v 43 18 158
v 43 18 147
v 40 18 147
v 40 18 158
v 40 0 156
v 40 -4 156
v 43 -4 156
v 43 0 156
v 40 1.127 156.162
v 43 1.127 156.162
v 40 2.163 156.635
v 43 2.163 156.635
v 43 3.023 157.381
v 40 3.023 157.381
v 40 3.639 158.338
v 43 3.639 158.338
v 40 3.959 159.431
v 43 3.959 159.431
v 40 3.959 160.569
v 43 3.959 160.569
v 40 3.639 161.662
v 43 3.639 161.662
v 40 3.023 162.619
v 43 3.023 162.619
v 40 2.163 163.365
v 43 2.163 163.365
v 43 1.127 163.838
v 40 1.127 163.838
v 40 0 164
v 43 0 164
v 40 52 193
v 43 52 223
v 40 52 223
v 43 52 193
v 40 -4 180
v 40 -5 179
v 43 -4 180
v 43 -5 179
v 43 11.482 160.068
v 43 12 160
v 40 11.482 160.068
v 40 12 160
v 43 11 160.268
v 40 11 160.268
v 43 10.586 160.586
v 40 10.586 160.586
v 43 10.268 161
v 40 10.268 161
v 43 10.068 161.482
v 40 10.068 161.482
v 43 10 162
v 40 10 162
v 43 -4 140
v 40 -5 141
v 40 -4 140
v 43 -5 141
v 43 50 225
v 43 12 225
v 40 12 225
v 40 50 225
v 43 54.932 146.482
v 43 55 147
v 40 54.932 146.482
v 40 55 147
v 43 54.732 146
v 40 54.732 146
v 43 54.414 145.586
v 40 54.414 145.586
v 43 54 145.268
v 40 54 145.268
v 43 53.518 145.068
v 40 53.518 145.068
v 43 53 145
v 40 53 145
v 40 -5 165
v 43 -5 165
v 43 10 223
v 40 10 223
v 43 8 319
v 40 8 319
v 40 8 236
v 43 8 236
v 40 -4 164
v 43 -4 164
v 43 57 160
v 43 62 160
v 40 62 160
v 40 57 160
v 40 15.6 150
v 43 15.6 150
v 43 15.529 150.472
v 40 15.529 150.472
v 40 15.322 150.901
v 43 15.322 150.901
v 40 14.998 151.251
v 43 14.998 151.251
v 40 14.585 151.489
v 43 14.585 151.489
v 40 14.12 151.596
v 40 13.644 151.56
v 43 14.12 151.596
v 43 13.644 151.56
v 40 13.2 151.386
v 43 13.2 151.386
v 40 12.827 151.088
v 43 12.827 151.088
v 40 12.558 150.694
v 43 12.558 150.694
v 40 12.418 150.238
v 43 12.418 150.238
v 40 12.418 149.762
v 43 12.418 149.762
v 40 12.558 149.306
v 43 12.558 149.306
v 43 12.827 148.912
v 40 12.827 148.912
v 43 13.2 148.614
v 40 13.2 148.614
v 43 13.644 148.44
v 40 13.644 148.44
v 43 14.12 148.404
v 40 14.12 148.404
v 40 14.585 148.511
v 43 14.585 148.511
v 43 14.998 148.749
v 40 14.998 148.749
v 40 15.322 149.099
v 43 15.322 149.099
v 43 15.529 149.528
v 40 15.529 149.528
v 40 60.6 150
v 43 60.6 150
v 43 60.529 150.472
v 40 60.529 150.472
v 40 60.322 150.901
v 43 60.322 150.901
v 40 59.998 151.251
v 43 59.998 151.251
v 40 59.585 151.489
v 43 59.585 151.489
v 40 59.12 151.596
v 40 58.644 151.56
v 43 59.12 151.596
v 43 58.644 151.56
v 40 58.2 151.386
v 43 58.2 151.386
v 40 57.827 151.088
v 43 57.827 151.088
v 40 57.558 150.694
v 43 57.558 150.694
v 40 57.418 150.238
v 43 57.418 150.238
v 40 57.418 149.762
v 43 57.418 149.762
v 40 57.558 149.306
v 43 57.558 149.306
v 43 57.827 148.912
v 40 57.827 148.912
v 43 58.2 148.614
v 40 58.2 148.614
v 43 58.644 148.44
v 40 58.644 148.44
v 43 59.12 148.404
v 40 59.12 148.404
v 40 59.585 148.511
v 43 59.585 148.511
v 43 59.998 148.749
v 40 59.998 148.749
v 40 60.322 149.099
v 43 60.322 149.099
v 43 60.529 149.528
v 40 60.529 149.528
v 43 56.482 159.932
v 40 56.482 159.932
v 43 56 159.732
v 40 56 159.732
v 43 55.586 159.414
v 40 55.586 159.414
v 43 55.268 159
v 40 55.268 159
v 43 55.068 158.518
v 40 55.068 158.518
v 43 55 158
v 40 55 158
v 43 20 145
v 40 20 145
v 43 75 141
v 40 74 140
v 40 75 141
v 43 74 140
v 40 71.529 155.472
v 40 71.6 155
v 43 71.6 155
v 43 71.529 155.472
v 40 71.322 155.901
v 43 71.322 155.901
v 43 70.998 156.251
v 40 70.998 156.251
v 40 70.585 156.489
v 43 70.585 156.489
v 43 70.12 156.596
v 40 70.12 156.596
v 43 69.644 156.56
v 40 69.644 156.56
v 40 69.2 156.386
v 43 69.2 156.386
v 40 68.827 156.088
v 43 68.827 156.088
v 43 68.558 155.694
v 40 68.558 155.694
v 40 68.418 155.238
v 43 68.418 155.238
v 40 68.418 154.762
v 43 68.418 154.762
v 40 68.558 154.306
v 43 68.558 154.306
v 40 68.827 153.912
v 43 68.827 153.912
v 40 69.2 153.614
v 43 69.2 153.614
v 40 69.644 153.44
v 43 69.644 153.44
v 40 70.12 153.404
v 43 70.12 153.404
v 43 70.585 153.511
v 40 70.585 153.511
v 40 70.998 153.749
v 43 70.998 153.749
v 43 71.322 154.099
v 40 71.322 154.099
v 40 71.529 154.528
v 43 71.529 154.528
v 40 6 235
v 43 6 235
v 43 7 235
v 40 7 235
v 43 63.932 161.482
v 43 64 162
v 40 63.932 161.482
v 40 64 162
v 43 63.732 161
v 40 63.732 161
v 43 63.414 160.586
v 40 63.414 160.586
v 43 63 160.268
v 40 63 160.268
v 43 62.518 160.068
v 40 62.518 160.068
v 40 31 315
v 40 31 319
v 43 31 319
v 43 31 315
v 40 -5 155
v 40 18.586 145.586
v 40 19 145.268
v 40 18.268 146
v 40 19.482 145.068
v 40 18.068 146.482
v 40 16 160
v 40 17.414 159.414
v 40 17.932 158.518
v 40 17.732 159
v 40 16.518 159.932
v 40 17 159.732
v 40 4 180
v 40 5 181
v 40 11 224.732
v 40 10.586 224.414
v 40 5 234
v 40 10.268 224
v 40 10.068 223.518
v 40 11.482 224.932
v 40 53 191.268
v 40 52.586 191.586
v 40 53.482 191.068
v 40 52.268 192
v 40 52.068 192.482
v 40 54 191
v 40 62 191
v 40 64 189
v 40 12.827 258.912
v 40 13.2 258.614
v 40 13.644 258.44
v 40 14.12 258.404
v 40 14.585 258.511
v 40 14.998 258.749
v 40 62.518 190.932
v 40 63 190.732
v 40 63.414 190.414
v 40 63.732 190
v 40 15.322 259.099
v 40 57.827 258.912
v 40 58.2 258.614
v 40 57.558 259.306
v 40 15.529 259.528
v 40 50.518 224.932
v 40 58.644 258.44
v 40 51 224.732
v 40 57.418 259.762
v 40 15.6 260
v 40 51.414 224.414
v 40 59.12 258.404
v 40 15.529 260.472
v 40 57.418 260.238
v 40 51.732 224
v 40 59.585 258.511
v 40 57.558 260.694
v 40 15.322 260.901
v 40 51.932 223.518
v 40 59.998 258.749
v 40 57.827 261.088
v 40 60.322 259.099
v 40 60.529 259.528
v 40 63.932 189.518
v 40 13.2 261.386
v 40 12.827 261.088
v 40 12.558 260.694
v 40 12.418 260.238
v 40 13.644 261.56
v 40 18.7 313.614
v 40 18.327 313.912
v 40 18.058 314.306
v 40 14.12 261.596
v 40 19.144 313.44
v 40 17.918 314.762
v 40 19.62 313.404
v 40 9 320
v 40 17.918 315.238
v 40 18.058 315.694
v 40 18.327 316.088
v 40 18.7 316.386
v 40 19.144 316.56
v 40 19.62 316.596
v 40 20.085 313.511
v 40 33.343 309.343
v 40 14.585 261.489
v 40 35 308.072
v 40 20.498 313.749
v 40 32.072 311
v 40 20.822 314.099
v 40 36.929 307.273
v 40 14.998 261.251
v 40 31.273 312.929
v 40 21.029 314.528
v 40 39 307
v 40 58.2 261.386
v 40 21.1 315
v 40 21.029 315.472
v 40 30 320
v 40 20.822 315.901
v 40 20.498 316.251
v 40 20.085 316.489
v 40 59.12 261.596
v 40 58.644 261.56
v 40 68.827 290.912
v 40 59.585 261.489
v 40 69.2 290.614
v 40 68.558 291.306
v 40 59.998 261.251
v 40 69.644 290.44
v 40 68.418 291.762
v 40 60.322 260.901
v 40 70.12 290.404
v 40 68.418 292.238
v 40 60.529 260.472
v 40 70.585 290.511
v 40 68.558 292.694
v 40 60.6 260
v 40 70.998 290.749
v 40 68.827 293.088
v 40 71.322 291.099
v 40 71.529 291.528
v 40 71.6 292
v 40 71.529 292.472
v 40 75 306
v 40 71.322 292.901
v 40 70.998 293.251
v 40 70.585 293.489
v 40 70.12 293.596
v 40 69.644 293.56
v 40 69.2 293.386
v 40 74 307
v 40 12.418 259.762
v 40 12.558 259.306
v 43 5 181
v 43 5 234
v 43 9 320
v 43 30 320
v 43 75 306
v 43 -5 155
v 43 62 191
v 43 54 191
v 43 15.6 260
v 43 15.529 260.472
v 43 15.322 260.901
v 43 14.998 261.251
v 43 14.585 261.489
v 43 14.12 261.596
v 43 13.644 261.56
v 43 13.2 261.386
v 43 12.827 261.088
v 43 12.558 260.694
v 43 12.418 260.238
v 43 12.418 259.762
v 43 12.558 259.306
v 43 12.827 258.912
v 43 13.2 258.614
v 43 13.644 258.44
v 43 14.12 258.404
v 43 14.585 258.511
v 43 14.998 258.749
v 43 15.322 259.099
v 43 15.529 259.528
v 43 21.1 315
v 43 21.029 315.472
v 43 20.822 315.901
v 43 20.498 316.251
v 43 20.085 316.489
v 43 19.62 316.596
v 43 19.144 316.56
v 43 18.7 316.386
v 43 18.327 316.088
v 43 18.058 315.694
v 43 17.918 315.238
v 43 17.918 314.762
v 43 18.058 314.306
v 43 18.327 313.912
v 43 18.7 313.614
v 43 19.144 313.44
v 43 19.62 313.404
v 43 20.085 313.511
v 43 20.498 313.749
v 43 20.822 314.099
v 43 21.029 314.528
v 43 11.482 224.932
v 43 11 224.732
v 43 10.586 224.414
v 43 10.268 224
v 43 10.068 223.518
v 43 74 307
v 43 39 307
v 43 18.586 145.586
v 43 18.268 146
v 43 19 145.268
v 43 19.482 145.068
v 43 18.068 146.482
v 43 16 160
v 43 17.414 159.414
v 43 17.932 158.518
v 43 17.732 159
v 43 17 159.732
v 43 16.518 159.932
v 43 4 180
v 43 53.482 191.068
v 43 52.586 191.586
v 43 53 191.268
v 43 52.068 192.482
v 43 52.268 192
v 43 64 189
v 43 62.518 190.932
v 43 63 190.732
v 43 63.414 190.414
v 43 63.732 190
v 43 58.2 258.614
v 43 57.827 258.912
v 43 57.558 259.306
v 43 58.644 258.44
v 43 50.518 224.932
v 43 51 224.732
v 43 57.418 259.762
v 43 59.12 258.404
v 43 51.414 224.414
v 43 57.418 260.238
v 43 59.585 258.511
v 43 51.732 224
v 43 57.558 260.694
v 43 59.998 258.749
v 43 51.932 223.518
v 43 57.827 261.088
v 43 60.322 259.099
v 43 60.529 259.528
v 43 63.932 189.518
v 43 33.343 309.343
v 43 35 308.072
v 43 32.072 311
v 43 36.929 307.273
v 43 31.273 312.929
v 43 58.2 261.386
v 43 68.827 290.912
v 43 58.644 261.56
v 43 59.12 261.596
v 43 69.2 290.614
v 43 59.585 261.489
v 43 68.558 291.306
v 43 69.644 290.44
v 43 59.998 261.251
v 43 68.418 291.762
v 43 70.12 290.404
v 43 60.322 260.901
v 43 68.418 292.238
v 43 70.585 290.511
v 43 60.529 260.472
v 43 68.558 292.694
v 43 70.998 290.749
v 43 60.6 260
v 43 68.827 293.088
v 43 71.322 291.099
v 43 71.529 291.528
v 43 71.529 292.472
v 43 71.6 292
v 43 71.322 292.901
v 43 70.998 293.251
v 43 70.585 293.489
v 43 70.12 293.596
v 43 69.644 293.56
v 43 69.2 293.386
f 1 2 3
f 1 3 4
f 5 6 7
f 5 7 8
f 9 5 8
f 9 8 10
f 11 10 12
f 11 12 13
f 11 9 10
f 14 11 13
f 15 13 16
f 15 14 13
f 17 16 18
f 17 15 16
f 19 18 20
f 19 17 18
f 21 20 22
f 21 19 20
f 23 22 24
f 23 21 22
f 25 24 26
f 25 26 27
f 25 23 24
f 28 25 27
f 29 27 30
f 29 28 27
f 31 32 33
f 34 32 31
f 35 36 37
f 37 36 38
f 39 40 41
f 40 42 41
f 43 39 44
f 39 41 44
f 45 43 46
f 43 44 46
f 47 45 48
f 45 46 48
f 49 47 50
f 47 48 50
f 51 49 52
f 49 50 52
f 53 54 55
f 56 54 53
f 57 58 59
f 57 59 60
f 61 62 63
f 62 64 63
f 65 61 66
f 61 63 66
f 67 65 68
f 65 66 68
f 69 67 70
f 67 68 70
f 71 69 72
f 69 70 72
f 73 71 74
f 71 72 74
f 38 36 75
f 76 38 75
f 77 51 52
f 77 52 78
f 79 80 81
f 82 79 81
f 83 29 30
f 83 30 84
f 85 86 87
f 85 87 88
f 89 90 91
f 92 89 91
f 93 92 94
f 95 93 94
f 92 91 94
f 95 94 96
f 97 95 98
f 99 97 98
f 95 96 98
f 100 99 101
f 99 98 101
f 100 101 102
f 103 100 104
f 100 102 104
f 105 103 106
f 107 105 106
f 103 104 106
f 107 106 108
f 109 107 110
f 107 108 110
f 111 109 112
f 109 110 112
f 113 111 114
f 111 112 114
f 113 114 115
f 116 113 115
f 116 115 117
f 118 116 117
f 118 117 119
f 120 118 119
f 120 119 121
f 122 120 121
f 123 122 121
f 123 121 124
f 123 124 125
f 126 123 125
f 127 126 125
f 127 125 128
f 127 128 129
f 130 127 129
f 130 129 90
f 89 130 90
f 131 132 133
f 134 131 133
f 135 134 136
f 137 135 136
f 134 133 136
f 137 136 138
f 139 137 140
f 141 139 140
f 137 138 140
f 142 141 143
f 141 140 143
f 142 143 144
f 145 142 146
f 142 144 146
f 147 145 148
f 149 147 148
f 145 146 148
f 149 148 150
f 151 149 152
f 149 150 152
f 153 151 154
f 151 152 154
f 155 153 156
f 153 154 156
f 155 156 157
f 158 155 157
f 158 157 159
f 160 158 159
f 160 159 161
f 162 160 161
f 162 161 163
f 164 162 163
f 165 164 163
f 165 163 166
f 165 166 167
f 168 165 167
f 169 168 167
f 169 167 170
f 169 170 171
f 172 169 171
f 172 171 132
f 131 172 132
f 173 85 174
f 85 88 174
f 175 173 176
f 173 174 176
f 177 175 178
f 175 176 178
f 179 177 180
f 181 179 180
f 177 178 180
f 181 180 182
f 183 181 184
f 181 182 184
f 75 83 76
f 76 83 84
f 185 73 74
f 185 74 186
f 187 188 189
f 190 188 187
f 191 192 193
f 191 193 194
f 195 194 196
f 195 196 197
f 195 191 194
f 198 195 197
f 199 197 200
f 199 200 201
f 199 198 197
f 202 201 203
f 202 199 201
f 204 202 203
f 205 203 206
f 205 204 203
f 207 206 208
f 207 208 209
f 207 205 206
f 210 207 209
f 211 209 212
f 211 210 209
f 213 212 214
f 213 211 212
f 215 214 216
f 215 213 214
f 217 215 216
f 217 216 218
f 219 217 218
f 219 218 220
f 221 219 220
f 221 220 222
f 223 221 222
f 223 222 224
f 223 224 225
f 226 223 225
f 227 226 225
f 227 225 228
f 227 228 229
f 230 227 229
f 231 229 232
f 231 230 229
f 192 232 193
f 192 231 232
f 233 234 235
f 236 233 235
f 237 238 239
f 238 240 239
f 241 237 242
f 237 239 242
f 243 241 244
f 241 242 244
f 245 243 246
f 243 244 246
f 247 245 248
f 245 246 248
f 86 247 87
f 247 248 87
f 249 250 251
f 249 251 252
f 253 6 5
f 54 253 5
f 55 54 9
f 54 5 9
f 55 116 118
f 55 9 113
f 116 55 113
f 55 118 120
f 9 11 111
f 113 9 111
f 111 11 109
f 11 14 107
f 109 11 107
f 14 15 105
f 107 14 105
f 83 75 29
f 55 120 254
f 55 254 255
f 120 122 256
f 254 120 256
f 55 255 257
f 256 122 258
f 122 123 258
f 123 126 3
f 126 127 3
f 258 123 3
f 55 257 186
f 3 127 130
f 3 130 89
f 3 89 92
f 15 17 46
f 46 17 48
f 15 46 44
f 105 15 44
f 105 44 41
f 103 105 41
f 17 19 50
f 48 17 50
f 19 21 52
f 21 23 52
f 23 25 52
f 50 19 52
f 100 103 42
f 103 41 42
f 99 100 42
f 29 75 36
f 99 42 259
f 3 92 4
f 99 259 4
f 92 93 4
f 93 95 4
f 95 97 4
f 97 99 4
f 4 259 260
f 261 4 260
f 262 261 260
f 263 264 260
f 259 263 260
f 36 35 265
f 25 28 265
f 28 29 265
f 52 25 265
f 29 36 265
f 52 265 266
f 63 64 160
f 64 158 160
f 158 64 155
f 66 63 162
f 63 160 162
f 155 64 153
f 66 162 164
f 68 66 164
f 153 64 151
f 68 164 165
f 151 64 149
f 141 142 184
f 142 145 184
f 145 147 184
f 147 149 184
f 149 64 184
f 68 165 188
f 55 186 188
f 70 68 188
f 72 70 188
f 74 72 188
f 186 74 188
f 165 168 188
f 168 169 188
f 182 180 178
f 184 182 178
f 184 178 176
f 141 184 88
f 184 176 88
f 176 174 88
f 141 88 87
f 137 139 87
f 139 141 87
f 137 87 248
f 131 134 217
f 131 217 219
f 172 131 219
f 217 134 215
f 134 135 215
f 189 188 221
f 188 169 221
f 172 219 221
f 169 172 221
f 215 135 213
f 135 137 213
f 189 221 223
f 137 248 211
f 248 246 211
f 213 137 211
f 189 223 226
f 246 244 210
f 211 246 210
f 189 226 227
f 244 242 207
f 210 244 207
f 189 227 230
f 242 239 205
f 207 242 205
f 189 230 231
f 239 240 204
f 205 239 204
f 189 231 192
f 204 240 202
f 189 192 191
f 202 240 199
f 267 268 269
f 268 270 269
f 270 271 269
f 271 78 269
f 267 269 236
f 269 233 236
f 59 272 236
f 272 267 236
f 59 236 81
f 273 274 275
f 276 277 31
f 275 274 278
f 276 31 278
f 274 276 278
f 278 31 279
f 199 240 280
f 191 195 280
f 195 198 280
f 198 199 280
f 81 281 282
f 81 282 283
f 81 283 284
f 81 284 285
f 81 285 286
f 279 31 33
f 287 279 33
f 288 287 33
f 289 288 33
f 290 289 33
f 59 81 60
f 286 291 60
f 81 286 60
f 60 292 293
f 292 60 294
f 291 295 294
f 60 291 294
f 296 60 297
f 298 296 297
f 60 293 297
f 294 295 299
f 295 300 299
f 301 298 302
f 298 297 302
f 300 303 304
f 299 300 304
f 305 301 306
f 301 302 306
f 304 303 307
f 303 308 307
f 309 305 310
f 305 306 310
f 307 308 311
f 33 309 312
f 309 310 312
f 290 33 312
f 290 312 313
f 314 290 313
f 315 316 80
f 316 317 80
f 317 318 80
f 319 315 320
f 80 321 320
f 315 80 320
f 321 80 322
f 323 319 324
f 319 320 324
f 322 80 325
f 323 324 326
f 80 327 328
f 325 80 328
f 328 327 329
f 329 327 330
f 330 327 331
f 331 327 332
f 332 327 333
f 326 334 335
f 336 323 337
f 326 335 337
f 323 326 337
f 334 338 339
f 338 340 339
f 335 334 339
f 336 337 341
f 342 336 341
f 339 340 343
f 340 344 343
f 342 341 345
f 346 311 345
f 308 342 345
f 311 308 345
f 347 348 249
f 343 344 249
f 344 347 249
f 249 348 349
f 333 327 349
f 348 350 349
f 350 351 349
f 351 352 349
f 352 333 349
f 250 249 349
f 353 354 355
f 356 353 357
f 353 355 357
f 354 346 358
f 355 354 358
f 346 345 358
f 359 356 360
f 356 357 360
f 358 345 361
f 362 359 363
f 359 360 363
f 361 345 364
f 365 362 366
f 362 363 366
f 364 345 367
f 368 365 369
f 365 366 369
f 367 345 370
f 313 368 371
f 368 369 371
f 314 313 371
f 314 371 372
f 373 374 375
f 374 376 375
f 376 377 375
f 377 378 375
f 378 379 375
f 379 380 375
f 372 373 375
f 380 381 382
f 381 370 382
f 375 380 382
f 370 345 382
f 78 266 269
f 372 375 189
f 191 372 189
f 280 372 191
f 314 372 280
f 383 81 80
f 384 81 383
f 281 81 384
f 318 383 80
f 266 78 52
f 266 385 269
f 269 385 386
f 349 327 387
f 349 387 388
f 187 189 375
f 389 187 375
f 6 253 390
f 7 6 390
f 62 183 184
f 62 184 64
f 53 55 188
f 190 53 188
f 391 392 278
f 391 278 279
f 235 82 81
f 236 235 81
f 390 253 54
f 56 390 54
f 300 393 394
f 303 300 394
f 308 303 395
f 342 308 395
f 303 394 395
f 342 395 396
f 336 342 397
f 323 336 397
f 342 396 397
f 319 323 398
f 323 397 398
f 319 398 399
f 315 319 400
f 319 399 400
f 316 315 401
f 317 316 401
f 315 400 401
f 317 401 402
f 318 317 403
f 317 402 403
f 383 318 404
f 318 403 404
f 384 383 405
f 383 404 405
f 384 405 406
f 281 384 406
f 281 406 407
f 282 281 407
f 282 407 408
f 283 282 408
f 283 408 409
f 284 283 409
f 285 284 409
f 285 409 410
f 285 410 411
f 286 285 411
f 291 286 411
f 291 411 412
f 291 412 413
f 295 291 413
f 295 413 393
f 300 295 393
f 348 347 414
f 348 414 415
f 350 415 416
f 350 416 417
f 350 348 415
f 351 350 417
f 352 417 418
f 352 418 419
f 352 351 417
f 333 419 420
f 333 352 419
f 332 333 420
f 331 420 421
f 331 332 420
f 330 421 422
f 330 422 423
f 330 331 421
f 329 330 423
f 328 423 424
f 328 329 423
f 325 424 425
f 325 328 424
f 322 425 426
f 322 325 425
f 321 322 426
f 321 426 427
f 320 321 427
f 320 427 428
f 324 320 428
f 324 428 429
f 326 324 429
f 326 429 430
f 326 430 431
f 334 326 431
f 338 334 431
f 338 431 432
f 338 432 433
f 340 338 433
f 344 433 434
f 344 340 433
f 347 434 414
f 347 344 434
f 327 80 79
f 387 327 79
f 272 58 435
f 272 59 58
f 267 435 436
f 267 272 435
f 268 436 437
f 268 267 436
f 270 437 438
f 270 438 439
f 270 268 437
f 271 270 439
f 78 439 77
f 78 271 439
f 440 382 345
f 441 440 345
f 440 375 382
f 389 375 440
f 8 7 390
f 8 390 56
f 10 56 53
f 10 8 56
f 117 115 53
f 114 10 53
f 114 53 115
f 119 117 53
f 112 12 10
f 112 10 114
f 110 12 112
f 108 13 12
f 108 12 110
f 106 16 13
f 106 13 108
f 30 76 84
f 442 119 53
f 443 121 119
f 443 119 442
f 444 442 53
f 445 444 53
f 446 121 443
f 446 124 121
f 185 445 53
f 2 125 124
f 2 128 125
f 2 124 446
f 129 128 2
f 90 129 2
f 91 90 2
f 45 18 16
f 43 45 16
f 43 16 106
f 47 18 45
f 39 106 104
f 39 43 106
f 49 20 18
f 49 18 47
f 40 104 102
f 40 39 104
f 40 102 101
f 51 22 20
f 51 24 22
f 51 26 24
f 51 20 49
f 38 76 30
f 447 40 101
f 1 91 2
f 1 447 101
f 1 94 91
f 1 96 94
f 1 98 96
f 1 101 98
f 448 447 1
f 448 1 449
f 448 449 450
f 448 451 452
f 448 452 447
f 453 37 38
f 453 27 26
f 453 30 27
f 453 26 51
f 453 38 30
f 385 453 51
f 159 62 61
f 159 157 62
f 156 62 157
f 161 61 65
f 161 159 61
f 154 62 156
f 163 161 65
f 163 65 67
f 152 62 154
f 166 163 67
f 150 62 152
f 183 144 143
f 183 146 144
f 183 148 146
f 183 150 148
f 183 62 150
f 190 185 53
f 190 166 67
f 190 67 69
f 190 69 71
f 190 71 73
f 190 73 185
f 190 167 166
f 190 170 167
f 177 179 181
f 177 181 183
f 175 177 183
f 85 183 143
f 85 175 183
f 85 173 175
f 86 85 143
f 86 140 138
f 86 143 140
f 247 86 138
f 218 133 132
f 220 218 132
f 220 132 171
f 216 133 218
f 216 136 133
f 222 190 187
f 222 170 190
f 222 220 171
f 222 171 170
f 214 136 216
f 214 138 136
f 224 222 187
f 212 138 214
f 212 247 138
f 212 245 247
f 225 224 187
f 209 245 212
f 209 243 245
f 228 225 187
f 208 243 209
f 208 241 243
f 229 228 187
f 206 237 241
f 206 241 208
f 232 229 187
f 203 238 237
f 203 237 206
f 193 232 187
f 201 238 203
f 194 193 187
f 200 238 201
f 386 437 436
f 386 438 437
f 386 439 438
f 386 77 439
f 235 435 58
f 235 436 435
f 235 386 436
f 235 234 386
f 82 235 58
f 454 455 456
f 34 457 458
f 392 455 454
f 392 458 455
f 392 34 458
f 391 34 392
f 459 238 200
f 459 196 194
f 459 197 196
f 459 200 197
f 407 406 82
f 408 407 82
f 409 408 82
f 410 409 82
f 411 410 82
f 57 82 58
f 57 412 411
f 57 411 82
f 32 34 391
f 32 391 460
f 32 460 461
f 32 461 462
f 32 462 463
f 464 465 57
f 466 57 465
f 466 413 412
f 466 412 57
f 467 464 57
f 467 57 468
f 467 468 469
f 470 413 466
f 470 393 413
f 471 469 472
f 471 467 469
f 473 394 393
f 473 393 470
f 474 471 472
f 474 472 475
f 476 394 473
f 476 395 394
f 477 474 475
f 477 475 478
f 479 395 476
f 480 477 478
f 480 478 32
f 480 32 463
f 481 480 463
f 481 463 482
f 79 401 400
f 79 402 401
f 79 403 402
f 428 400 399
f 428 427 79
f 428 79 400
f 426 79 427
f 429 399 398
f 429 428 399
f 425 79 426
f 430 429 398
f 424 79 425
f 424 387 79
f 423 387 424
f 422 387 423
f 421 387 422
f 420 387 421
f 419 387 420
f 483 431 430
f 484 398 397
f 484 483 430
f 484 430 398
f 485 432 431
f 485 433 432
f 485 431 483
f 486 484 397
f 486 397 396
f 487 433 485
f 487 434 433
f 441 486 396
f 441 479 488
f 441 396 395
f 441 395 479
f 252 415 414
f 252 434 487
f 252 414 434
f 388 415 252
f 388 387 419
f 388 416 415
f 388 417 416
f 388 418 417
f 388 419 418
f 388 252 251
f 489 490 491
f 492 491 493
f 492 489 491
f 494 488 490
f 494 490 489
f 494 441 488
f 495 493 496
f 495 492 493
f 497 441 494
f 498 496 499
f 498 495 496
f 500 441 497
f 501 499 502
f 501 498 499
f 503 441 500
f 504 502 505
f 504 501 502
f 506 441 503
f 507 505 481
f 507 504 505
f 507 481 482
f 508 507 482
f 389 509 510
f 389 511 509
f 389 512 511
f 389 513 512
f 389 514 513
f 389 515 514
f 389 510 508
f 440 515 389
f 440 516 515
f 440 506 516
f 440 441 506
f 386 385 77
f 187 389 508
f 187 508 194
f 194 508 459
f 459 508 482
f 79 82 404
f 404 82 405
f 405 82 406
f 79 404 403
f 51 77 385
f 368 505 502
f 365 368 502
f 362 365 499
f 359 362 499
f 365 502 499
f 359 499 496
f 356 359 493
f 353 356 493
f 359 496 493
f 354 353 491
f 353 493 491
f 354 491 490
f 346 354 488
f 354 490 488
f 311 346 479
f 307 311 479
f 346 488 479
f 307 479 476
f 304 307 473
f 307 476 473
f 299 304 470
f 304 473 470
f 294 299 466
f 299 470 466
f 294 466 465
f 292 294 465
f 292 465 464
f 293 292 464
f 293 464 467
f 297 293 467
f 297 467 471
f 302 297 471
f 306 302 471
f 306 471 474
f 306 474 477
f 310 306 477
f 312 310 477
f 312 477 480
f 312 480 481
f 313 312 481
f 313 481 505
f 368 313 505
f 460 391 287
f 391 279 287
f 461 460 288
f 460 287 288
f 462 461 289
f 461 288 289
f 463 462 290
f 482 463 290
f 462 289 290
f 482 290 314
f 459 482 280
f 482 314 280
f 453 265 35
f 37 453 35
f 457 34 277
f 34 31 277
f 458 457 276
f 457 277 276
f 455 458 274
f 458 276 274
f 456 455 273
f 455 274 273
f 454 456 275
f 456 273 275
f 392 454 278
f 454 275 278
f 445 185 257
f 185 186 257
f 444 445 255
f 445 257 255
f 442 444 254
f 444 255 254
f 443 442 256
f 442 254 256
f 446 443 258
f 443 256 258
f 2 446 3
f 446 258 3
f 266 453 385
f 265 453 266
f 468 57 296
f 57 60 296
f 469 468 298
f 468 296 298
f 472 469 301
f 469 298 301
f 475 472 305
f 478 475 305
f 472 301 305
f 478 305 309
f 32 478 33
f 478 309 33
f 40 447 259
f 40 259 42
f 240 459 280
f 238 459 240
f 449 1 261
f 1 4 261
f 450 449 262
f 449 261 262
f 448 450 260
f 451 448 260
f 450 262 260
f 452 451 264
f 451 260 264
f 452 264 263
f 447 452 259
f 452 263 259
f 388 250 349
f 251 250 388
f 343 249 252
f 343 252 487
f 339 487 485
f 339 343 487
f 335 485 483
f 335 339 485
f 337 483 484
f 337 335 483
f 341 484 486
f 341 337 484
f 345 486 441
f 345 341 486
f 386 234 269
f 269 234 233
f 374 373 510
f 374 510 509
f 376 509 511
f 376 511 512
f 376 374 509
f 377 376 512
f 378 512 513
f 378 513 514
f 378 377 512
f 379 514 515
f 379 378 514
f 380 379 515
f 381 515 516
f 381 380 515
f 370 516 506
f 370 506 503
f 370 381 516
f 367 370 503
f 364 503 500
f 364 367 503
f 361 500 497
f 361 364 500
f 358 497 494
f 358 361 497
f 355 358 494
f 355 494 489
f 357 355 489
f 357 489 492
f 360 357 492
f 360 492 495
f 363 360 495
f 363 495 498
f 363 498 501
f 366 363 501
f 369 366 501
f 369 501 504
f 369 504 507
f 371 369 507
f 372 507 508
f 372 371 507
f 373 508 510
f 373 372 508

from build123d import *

# Parameters (mm, degrees)
SKETCH_R        = 1.6
PAD_DEPTH       = 3
CHAMFER_SIZE    = 1
POCKET014_DEPTH = 3.001
CHAMFER059_SIZE = 1
SKETCH159_R     = 1.6
POCKET015_DEPTH = 43.001
SKETCH188_W     = 37.119205
SKETCH188_H     = 78.955215
SKETCH188_W_2   = 7
SKETCH188_H_2   = 30
PAD099_DEPTH    = 3
SKETCH189_R     = 1.6
POCKET032_DEPTH = 3.001
SKETCH190_W     = 3
SKETCH190_H     = 55
PAD100_DEPTH    = 3
CHAMFER065_SIZE = 1
FILLET066_R     = 2


with BuildPart() as part:
    # Sketch → Pad (new body)
    with BuildSketch(Plane.YZ.offset(40)):
        with BuildLine():
            Line((8, 320), (31, 320))
            Line((31, 320), (31, 315))
            ThreePointArc((31, 315), (33.343146, 309.343146), (39, 307))
            Line((75, 307), (39, 307))
            Line((75, 140), (75, 307))
            Line((-5, 140), (75, 140))
            Line((-5, 156), (-5, 140))
            Line((-5, 156), (0, 156))
            ThreePointArc((0, 156), (4, 160), (0, 164))
            Line((0, 164), (-5, 164))
            Line((-5, 180), (-5, 164))
            Line((8, 180), (-5, 180))
            Line((8, 320), (8, 180))
        make_face()
        with Locations((19.5, 315)):
            Circle(SKETCH_R, mode=Mode.SUBTRACT)
        with Locations((70, 292)):
            Circle(SKETCH_R, mode=Mode.SUBTRACT)
        with Locations((70, 155)):
            Circle(SKETCH_R, mode=Mode.SUBTRACT)
    extrude(amount=PAD_DEPTH)

    # Chamfer
    chamfer_edges = [part.edges().sort_by_distance(p)[0] for p in [
        (41.5, -5, 180),
        (41.5, 8, 180),
        (41.5, -5, 164),
        (41.5, -5, 156),
        (41.5, -5, 140),
        (41.5, 75, 140),
        (41.5, 75, 307),
        (41.5, 8, 320),
        (41.5, 31, 320),
    ]]
    chamfer(chamfer_edges, length=CHAMFER_SIZE)

    # Sketch158 (on Face5 of Chamfer) → Pocket014 (cut, through all)
    with BuildSketch(Plane.YZ.offset(43)):
        with BuildLine():
            ThreePointArc((54, 140), (56.5, 137.5), (59, 140))
            Line((59, 140), (59, 160))
            ThreePointArc((59, 160), (56.5, 162.5), (54, 160))
            Line((54, 160), (54, 140))
        make_face()
    extrude(amount=-POCKET014_DEPTH, mode=Mode.SUBTRACT)

    # Chamfer059
    chamfer059_edges = [part.edges().sort_by_distance(p)[0] for p in [
        (41.5, 54, 140),
        (41.5, 59, 140),
    ]]
    chamfer(chamfer059_edges, length=CHAMFER059_SIZE)

    # Sketch159 → Pocket015 (cut, through all)
    with BuildSketch(Plane.YZ):
        with Locations((18, 260)):
            Circle(SKETCH159_R)
        with Locations((35.78, 260)):
            Circle(SKETCH159_R)
        with Locations((18, 204.76)):
            Circle(SKETCH159_R)
        with Locations((35.78, 204.76)):
            Circle(SKETCH159_R)
    extrude(amount=POCKET015_DEPTH, mode=Mode.SUBTRACT)

    # Sketch188 (on Face37 of Clone004) → Pad099 (new body)
    with BuildSketch(Plane.YZ.offset(43)):
        with Locations((30.900274, 230.820335)):
            Rectangle(SKETCH188_W, SKETCH188_H)
        with Locations((56.5, 155)):
            Rectangle(SKETCH188_W_2, SKETCH188_H_2)
    extrude(amount=-PAD099_DEPTH)

    # Sketch189 (on Face27 of Pad099) → Pocket032 (cut, through all)
    with BuildSketch(Plane.YZ.offset(43)):
        with Locations((14, 260)):
            Circle(SKETCH189_R)
        with Locations((59, 260)):
            Circle(SKETCH189_R)
        with Locations((59, 150)):
            Circle(SKETCH189_R)
        with Locations((14, 150)):
            Circle(SKETCH189_R)
        Polygon((10, 225), (52, 225), (52, 191), (64, 191), (64, 160), (55, 160), (55, 145), (18, 145), (18, 160), (10, 160), align=None)
    extrude(amount=-POCKET032_DEPTH, mode=Mode.SUBTRACT)

    # Sketch190 (on Face5 of Pocket032) → Pad100 (join)
    with BuildSketch(Plane.YZ.offset(43)):
        with Locations((6.5, 207.5)):
            Rectangle(SKETCH190_W, SKETCH190_H)
    extrude(amount=-PAD100_DEPTH)

    # Chamfer065
    chamfer065_edges = [part.edges().sort_by_distance(p)[0] for p in [
        (41.5, 5, 180),
        (41.5, 5, 235),
        (41.5, 8, 235),
    ]]
    chamfer(chamfer065_edges, length=CHAMFER065_SIZE)

    # Fillet066
    fillet066_edges = [part.edges().sort_by_distance(p)[0] for p in [
        (41.5, 18, 160),
        (41.5, 55, 160),
        (41.5, 52, 191),
        (41.5, 64, 160),
        (41.5, 64, 191),
        (41.5, 52, 225),
        (41.5, 10, 225),
        (41.5, 10, 160),
        (41.5, 55, 145),
        (41.5, 18, 145),
    ]]
    fillet(fillet066_edges, radius=FILLET066_R)


solid = part.part
